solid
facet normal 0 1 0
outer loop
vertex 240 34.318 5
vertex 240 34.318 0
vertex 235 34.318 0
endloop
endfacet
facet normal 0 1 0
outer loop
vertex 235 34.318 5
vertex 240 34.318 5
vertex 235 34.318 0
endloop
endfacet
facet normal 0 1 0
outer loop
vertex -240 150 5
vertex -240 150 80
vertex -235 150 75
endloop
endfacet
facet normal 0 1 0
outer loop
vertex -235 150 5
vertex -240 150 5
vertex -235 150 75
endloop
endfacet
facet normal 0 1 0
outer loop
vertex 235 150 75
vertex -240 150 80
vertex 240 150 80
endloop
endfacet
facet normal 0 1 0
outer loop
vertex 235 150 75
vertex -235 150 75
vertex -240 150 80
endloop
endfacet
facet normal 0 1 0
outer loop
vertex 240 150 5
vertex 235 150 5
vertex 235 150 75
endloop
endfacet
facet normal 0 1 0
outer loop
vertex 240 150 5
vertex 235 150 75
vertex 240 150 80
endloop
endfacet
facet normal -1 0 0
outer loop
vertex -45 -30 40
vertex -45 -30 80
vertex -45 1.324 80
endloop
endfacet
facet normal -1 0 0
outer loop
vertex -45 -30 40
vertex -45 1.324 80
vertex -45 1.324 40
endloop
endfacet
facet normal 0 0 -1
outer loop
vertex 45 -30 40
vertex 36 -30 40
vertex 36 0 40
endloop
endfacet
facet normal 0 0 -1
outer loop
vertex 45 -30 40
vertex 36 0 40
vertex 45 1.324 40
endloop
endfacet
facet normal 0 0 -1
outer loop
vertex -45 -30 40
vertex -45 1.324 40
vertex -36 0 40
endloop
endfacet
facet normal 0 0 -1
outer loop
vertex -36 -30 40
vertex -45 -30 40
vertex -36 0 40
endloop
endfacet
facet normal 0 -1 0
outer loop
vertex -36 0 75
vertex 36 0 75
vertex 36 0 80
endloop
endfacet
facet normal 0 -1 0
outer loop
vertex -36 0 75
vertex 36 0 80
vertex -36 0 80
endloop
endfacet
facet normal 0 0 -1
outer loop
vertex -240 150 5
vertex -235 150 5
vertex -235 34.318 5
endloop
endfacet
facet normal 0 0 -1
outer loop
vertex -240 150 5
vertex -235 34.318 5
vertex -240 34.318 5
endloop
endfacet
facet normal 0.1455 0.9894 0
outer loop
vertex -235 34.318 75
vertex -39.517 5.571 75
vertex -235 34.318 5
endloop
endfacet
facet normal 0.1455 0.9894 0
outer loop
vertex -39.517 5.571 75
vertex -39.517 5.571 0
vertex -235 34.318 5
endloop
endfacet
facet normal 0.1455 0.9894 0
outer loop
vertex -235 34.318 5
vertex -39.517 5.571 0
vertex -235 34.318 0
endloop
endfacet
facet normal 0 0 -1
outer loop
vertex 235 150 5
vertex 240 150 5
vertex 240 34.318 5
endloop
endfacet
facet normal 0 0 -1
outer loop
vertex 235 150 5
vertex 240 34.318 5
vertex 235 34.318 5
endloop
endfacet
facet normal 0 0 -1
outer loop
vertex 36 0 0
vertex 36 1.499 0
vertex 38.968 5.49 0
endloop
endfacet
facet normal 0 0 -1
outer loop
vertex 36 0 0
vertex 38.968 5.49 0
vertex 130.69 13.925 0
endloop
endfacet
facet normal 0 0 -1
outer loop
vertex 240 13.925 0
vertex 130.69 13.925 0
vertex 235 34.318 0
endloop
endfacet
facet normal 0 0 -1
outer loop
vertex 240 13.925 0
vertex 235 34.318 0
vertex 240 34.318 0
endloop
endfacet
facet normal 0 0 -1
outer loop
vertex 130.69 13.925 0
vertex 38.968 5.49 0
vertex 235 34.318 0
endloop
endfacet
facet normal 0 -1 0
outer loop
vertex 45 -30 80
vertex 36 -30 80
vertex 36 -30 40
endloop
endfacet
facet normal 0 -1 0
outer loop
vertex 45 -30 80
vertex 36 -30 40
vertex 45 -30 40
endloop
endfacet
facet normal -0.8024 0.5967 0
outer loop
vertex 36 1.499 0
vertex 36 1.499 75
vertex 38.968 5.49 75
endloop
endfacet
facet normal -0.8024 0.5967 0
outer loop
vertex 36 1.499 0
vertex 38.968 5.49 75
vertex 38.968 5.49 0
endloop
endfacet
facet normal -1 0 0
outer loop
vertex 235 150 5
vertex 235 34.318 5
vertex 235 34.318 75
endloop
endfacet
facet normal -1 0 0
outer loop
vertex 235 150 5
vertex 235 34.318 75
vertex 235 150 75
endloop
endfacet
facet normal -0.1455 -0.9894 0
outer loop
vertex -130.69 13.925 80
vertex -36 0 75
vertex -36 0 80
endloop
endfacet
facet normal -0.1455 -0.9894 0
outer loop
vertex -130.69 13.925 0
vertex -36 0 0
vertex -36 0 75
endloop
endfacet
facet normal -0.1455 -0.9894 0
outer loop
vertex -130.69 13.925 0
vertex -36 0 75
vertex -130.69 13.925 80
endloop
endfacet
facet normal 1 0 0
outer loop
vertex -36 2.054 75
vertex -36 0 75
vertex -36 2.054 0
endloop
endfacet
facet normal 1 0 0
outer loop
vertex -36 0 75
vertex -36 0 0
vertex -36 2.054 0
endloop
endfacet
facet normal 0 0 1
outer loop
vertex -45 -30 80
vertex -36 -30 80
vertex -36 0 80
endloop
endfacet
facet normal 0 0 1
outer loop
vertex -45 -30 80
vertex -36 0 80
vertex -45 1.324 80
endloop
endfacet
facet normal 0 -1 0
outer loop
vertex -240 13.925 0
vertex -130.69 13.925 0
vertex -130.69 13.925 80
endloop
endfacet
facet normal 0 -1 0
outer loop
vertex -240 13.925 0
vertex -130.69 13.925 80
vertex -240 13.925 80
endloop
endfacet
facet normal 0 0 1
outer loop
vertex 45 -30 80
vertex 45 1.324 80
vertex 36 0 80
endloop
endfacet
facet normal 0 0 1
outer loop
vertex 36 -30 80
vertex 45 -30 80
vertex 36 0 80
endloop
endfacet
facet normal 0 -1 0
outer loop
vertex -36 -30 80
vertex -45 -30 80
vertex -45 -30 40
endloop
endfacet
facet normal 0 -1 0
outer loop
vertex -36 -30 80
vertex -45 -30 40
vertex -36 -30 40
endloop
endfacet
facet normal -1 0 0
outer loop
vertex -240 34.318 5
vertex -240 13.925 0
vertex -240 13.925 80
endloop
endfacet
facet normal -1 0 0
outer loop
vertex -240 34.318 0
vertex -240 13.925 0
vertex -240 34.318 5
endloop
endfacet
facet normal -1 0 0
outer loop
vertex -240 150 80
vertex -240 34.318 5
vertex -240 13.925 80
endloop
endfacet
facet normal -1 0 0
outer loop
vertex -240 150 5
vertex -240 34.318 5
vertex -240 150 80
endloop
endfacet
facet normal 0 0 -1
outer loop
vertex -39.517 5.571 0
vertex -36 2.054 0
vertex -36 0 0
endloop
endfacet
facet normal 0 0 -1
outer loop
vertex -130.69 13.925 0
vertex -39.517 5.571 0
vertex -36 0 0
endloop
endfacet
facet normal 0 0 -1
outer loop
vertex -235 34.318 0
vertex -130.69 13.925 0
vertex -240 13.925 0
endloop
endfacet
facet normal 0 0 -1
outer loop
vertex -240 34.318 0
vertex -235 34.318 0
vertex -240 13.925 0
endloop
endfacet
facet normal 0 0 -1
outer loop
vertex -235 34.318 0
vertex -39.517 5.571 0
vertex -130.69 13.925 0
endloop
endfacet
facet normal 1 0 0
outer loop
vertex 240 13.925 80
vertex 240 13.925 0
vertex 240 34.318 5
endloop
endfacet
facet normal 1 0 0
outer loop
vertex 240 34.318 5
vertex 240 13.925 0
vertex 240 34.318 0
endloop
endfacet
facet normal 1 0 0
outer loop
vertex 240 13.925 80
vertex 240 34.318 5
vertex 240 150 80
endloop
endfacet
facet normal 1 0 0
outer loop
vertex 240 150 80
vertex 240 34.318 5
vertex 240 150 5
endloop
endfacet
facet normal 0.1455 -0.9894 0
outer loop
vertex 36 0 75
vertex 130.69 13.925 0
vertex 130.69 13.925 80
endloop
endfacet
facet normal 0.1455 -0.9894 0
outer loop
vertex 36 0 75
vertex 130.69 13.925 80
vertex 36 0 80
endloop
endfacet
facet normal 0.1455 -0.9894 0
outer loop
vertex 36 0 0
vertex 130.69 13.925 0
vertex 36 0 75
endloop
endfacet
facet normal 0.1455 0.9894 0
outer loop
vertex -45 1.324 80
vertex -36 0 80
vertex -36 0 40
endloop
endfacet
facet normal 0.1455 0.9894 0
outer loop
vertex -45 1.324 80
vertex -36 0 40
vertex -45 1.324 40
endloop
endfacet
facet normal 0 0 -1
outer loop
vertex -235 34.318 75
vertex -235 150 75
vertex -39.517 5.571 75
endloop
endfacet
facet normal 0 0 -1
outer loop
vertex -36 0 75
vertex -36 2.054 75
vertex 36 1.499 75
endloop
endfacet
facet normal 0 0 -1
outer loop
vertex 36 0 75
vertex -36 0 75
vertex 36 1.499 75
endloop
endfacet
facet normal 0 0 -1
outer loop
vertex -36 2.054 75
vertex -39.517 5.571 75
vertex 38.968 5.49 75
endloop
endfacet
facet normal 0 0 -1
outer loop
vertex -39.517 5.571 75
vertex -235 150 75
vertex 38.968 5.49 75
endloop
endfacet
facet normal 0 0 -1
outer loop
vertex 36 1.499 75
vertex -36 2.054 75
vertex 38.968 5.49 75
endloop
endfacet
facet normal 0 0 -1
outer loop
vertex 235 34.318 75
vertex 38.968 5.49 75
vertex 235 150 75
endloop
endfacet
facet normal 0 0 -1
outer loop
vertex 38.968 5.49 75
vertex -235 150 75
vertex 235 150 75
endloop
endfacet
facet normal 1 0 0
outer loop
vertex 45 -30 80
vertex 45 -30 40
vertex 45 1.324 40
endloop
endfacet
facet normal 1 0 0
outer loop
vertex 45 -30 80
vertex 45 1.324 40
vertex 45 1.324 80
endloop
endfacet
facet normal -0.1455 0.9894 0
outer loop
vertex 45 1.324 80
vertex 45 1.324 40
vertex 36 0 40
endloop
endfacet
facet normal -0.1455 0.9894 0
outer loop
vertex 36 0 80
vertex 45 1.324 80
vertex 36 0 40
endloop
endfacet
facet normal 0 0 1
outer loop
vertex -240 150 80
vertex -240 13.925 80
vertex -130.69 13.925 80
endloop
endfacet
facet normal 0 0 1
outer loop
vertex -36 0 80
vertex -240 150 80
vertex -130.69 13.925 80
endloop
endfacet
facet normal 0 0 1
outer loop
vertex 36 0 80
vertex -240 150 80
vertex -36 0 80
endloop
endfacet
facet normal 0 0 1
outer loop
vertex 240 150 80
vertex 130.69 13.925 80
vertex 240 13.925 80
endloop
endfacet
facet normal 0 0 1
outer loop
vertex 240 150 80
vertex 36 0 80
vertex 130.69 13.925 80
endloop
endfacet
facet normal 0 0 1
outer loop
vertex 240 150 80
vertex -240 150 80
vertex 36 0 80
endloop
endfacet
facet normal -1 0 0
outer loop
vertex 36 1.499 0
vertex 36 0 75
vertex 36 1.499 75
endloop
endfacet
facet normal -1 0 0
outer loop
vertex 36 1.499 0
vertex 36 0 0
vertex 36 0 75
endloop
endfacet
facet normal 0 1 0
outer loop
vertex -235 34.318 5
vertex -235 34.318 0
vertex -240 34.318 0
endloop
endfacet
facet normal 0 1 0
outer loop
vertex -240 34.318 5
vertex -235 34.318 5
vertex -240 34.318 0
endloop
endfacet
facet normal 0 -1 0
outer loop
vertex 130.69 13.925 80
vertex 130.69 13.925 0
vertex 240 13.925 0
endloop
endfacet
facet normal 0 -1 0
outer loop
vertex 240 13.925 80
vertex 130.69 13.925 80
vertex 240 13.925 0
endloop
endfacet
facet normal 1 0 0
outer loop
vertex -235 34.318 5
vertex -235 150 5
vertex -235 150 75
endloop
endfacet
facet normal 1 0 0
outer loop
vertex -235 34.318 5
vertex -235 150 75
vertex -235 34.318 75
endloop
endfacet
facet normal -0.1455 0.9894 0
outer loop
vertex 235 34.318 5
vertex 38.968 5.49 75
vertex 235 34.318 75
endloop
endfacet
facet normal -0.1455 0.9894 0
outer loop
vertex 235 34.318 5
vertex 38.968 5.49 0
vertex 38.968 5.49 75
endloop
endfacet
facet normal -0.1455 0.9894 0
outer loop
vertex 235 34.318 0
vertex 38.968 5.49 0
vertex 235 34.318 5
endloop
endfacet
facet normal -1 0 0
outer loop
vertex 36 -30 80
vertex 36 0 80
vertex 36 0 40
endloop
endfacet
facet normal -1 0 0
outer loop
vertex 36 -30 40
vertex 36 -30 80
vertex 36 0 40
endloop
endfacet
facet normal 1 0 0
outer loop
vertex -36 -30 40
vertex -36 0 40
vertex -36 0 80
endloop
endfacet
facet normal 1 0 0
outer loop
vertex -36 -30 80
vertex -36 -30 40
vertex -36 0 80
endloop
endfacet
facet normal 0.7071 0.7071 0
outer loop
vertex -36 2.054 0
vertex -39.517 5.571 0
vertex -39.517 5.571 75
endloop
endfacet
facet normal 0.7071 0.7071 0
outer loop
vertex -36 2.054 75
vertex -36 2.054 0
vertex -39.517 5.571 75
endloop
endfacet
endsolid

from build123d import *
from OCP.BRepFilletAPI import BRepFilletAPI_MakeChamfer

# Parameters (mm, degrees)
EXTRUDE_1_DEPTH             = 80
CUT_EXTRUDE_1_DEPTH         = 70
CUT_EXTRUDE_2_DEPTH         = 5
EXTRUDE_3_DEPTH             = 30
EXTRUDE_3_DIRECTION_2_REACH = 296.109
EXTRUDE_4_DEPTH             = 80
CHAMFER_1_SIZE              = 3
CHAMFER_1_SIZE2             = 3.555070402


with BuildPart() as part:
    # 草圖20 → 填料-伸長1 (new body)
    with BuildSketch(Plane.XY):
        Polygon((-36, 0), (-240, 30), (-240, 150), (240, 150), (240, 30), (36, 0), align=None)
    extrude(amount=EXTRUDE_1_DEPTH)

    # 草圖22 → 除料-伸長1 (cut)
    with BuildSketch(Plane.XY.offset(5)):
        Polygon((-235, 34.318482435), (-36, 5.053776552), (-36, 0), (36, 0), (36, 5.053776552), (235, 34.318482435), (235, 150), (-235, 150), align=None)
    extrude(amount=CUT_EXTRUDE_1_DEPTH, mode=Mode.SUBTRACT)

    # 草圖23 → 除料-伸長2 (cut)
    with BuildSketch(Plane(origin=(0, 0, 0), x_dir=(-1, 0, 0), z_dir=(0, 0, -1))):
        Polygon((-240, 34.318482435), (-235, 34.318482435), (-36, 5.053776552), (-36, 0), (36, 0), (36, 5.053776552), (235, 34.318482435), (240, 34.318482435), (240, 150), (-240, 150), align=None)
    extrude(amount=-CUT_EXTRUDE_2_DEPTH, mode=Mode.SUBTRACT)


with BuildPart() as body_2:
    # 草圖25 → 填料-伸長3 (new body)
    with BuildSketch(Plane.XZ):
        Polygon((-36, 80), (-45, 80), (-45, 40), (-36, 40), (-36, 75), align=None)
        Polygon((45, 40), (45, 80), (36, 80), (36, 75), (36, 40), align=None)
    extrude(amount=EXTRUDE_3_DEPTH)


    # 草圖25 → 填料-伸長3 direction 2 (add, up to next)
    with BuildSketch(Plane.XZ, mode=Mode.PRIVATE) as extrude_3_direction_2_sk1:
        Polygon((-36, 80), (-45, 80), (-45, 40), (-36, 40), (-36, 75), align=None)
    extrude_3_direction_2_tool1 = extrude(extrude_3_direction_2_sk1.sketch, amount=-EXTRUDE_3_DIRECTION_2_REACH, mode=Mode.PRIVATE) - part.part
    # 草圖25 → 填料-伸長3 direction 2 (add, up to next)
    with BuildSketch(Plane.XZ, mode=Mode.PRIVATE) as extrude_3_direction_2_sk2:
        Polygon((45, 40), (45, 80), (36, 80), (36, 75), (36, 40), align=None)
    extrude_3_direction_2_tool2 = extrude(extrude_3_direction_2_sk2.sketch, amount=-EXTRUDE_3_DIRECTION_2_REACH, mode=Mode.PRIVATE) - part.part
    add(extrude_3_direction_2_tool1.solids().sort_by_distance((-40.5, 0, 60))[0])
    add(extrude_3_direction_2_tool2.solids().sort_by_distance((40.5, 0, 60))[0])


with BuildPart() as part_1:
    add(part.part)

    # 草圖26 → 填料-伸長4 (add)
    with BuildSketch(Plane(origin=(0, 0, 0), x_dir=(-1, 0, 0), z_dir=(0, 0, -1))):
        Polygon((-130.69, 13.925), (-240, 13.925), (-240, 30), align=None)
        Polygon((240, 13.925), (240, 30), (130.69, 13.925), align=None)
    extrude(amount=-EXTRUDE_4_DEPTH)

    # 導角1: one chamfer whose edges measure the first distance from different faces: ONE call of the kernel's chamfer builder (chamfer() names one face for all edges)
    chamfer_1_edges_1 = [part_1.edges().sort_by_distance(p)[0] for p in [
        (36, 5.053776552, 37.5),
    ]]
    chamfer_1_side_1 = [part_1.faces().sort_by_distance(p)[0] for p in [
        (135.5, 19.686129493, 37.5),
    ]]
    chamfer_1_edges_2 = [part_1.edges().sort_by_distance(p)[0] for p in [
        (-36, 5.053776552, 37.5),
    ]]
    chamfer_1_side_2 = [part_1.faces().sort_by_distance(p)[0] for p in [
        (-36, 2.526888276, 37.5),
    ]]
    chamfer_1 = BRepFilletAPI_MakeChamfer(part_1.part.solid().wrapped)
    for e in chamfer_1_edges_1:
        chamfer_1.Add(CHAMFER_1_SIZE, CHAMFER_1_SIZE2, e.wrapped, chamfer_1_side_1[0].wrapped)  # the first distance lies on this face
    for e in chamfer_1_edges_2:
        chamfer_1.Add(CHAMFER_1_SIZE, CHAMFER_1_SIZE2, e.wrapped, chamfer_1_side_2[0].wrapped)  # the first distance lies on this face
    add(Compound.cast(chamfer_1.Shape()), mode=Mode.REPLACE)


solid = Compound([body_2.part, part_1.part])
